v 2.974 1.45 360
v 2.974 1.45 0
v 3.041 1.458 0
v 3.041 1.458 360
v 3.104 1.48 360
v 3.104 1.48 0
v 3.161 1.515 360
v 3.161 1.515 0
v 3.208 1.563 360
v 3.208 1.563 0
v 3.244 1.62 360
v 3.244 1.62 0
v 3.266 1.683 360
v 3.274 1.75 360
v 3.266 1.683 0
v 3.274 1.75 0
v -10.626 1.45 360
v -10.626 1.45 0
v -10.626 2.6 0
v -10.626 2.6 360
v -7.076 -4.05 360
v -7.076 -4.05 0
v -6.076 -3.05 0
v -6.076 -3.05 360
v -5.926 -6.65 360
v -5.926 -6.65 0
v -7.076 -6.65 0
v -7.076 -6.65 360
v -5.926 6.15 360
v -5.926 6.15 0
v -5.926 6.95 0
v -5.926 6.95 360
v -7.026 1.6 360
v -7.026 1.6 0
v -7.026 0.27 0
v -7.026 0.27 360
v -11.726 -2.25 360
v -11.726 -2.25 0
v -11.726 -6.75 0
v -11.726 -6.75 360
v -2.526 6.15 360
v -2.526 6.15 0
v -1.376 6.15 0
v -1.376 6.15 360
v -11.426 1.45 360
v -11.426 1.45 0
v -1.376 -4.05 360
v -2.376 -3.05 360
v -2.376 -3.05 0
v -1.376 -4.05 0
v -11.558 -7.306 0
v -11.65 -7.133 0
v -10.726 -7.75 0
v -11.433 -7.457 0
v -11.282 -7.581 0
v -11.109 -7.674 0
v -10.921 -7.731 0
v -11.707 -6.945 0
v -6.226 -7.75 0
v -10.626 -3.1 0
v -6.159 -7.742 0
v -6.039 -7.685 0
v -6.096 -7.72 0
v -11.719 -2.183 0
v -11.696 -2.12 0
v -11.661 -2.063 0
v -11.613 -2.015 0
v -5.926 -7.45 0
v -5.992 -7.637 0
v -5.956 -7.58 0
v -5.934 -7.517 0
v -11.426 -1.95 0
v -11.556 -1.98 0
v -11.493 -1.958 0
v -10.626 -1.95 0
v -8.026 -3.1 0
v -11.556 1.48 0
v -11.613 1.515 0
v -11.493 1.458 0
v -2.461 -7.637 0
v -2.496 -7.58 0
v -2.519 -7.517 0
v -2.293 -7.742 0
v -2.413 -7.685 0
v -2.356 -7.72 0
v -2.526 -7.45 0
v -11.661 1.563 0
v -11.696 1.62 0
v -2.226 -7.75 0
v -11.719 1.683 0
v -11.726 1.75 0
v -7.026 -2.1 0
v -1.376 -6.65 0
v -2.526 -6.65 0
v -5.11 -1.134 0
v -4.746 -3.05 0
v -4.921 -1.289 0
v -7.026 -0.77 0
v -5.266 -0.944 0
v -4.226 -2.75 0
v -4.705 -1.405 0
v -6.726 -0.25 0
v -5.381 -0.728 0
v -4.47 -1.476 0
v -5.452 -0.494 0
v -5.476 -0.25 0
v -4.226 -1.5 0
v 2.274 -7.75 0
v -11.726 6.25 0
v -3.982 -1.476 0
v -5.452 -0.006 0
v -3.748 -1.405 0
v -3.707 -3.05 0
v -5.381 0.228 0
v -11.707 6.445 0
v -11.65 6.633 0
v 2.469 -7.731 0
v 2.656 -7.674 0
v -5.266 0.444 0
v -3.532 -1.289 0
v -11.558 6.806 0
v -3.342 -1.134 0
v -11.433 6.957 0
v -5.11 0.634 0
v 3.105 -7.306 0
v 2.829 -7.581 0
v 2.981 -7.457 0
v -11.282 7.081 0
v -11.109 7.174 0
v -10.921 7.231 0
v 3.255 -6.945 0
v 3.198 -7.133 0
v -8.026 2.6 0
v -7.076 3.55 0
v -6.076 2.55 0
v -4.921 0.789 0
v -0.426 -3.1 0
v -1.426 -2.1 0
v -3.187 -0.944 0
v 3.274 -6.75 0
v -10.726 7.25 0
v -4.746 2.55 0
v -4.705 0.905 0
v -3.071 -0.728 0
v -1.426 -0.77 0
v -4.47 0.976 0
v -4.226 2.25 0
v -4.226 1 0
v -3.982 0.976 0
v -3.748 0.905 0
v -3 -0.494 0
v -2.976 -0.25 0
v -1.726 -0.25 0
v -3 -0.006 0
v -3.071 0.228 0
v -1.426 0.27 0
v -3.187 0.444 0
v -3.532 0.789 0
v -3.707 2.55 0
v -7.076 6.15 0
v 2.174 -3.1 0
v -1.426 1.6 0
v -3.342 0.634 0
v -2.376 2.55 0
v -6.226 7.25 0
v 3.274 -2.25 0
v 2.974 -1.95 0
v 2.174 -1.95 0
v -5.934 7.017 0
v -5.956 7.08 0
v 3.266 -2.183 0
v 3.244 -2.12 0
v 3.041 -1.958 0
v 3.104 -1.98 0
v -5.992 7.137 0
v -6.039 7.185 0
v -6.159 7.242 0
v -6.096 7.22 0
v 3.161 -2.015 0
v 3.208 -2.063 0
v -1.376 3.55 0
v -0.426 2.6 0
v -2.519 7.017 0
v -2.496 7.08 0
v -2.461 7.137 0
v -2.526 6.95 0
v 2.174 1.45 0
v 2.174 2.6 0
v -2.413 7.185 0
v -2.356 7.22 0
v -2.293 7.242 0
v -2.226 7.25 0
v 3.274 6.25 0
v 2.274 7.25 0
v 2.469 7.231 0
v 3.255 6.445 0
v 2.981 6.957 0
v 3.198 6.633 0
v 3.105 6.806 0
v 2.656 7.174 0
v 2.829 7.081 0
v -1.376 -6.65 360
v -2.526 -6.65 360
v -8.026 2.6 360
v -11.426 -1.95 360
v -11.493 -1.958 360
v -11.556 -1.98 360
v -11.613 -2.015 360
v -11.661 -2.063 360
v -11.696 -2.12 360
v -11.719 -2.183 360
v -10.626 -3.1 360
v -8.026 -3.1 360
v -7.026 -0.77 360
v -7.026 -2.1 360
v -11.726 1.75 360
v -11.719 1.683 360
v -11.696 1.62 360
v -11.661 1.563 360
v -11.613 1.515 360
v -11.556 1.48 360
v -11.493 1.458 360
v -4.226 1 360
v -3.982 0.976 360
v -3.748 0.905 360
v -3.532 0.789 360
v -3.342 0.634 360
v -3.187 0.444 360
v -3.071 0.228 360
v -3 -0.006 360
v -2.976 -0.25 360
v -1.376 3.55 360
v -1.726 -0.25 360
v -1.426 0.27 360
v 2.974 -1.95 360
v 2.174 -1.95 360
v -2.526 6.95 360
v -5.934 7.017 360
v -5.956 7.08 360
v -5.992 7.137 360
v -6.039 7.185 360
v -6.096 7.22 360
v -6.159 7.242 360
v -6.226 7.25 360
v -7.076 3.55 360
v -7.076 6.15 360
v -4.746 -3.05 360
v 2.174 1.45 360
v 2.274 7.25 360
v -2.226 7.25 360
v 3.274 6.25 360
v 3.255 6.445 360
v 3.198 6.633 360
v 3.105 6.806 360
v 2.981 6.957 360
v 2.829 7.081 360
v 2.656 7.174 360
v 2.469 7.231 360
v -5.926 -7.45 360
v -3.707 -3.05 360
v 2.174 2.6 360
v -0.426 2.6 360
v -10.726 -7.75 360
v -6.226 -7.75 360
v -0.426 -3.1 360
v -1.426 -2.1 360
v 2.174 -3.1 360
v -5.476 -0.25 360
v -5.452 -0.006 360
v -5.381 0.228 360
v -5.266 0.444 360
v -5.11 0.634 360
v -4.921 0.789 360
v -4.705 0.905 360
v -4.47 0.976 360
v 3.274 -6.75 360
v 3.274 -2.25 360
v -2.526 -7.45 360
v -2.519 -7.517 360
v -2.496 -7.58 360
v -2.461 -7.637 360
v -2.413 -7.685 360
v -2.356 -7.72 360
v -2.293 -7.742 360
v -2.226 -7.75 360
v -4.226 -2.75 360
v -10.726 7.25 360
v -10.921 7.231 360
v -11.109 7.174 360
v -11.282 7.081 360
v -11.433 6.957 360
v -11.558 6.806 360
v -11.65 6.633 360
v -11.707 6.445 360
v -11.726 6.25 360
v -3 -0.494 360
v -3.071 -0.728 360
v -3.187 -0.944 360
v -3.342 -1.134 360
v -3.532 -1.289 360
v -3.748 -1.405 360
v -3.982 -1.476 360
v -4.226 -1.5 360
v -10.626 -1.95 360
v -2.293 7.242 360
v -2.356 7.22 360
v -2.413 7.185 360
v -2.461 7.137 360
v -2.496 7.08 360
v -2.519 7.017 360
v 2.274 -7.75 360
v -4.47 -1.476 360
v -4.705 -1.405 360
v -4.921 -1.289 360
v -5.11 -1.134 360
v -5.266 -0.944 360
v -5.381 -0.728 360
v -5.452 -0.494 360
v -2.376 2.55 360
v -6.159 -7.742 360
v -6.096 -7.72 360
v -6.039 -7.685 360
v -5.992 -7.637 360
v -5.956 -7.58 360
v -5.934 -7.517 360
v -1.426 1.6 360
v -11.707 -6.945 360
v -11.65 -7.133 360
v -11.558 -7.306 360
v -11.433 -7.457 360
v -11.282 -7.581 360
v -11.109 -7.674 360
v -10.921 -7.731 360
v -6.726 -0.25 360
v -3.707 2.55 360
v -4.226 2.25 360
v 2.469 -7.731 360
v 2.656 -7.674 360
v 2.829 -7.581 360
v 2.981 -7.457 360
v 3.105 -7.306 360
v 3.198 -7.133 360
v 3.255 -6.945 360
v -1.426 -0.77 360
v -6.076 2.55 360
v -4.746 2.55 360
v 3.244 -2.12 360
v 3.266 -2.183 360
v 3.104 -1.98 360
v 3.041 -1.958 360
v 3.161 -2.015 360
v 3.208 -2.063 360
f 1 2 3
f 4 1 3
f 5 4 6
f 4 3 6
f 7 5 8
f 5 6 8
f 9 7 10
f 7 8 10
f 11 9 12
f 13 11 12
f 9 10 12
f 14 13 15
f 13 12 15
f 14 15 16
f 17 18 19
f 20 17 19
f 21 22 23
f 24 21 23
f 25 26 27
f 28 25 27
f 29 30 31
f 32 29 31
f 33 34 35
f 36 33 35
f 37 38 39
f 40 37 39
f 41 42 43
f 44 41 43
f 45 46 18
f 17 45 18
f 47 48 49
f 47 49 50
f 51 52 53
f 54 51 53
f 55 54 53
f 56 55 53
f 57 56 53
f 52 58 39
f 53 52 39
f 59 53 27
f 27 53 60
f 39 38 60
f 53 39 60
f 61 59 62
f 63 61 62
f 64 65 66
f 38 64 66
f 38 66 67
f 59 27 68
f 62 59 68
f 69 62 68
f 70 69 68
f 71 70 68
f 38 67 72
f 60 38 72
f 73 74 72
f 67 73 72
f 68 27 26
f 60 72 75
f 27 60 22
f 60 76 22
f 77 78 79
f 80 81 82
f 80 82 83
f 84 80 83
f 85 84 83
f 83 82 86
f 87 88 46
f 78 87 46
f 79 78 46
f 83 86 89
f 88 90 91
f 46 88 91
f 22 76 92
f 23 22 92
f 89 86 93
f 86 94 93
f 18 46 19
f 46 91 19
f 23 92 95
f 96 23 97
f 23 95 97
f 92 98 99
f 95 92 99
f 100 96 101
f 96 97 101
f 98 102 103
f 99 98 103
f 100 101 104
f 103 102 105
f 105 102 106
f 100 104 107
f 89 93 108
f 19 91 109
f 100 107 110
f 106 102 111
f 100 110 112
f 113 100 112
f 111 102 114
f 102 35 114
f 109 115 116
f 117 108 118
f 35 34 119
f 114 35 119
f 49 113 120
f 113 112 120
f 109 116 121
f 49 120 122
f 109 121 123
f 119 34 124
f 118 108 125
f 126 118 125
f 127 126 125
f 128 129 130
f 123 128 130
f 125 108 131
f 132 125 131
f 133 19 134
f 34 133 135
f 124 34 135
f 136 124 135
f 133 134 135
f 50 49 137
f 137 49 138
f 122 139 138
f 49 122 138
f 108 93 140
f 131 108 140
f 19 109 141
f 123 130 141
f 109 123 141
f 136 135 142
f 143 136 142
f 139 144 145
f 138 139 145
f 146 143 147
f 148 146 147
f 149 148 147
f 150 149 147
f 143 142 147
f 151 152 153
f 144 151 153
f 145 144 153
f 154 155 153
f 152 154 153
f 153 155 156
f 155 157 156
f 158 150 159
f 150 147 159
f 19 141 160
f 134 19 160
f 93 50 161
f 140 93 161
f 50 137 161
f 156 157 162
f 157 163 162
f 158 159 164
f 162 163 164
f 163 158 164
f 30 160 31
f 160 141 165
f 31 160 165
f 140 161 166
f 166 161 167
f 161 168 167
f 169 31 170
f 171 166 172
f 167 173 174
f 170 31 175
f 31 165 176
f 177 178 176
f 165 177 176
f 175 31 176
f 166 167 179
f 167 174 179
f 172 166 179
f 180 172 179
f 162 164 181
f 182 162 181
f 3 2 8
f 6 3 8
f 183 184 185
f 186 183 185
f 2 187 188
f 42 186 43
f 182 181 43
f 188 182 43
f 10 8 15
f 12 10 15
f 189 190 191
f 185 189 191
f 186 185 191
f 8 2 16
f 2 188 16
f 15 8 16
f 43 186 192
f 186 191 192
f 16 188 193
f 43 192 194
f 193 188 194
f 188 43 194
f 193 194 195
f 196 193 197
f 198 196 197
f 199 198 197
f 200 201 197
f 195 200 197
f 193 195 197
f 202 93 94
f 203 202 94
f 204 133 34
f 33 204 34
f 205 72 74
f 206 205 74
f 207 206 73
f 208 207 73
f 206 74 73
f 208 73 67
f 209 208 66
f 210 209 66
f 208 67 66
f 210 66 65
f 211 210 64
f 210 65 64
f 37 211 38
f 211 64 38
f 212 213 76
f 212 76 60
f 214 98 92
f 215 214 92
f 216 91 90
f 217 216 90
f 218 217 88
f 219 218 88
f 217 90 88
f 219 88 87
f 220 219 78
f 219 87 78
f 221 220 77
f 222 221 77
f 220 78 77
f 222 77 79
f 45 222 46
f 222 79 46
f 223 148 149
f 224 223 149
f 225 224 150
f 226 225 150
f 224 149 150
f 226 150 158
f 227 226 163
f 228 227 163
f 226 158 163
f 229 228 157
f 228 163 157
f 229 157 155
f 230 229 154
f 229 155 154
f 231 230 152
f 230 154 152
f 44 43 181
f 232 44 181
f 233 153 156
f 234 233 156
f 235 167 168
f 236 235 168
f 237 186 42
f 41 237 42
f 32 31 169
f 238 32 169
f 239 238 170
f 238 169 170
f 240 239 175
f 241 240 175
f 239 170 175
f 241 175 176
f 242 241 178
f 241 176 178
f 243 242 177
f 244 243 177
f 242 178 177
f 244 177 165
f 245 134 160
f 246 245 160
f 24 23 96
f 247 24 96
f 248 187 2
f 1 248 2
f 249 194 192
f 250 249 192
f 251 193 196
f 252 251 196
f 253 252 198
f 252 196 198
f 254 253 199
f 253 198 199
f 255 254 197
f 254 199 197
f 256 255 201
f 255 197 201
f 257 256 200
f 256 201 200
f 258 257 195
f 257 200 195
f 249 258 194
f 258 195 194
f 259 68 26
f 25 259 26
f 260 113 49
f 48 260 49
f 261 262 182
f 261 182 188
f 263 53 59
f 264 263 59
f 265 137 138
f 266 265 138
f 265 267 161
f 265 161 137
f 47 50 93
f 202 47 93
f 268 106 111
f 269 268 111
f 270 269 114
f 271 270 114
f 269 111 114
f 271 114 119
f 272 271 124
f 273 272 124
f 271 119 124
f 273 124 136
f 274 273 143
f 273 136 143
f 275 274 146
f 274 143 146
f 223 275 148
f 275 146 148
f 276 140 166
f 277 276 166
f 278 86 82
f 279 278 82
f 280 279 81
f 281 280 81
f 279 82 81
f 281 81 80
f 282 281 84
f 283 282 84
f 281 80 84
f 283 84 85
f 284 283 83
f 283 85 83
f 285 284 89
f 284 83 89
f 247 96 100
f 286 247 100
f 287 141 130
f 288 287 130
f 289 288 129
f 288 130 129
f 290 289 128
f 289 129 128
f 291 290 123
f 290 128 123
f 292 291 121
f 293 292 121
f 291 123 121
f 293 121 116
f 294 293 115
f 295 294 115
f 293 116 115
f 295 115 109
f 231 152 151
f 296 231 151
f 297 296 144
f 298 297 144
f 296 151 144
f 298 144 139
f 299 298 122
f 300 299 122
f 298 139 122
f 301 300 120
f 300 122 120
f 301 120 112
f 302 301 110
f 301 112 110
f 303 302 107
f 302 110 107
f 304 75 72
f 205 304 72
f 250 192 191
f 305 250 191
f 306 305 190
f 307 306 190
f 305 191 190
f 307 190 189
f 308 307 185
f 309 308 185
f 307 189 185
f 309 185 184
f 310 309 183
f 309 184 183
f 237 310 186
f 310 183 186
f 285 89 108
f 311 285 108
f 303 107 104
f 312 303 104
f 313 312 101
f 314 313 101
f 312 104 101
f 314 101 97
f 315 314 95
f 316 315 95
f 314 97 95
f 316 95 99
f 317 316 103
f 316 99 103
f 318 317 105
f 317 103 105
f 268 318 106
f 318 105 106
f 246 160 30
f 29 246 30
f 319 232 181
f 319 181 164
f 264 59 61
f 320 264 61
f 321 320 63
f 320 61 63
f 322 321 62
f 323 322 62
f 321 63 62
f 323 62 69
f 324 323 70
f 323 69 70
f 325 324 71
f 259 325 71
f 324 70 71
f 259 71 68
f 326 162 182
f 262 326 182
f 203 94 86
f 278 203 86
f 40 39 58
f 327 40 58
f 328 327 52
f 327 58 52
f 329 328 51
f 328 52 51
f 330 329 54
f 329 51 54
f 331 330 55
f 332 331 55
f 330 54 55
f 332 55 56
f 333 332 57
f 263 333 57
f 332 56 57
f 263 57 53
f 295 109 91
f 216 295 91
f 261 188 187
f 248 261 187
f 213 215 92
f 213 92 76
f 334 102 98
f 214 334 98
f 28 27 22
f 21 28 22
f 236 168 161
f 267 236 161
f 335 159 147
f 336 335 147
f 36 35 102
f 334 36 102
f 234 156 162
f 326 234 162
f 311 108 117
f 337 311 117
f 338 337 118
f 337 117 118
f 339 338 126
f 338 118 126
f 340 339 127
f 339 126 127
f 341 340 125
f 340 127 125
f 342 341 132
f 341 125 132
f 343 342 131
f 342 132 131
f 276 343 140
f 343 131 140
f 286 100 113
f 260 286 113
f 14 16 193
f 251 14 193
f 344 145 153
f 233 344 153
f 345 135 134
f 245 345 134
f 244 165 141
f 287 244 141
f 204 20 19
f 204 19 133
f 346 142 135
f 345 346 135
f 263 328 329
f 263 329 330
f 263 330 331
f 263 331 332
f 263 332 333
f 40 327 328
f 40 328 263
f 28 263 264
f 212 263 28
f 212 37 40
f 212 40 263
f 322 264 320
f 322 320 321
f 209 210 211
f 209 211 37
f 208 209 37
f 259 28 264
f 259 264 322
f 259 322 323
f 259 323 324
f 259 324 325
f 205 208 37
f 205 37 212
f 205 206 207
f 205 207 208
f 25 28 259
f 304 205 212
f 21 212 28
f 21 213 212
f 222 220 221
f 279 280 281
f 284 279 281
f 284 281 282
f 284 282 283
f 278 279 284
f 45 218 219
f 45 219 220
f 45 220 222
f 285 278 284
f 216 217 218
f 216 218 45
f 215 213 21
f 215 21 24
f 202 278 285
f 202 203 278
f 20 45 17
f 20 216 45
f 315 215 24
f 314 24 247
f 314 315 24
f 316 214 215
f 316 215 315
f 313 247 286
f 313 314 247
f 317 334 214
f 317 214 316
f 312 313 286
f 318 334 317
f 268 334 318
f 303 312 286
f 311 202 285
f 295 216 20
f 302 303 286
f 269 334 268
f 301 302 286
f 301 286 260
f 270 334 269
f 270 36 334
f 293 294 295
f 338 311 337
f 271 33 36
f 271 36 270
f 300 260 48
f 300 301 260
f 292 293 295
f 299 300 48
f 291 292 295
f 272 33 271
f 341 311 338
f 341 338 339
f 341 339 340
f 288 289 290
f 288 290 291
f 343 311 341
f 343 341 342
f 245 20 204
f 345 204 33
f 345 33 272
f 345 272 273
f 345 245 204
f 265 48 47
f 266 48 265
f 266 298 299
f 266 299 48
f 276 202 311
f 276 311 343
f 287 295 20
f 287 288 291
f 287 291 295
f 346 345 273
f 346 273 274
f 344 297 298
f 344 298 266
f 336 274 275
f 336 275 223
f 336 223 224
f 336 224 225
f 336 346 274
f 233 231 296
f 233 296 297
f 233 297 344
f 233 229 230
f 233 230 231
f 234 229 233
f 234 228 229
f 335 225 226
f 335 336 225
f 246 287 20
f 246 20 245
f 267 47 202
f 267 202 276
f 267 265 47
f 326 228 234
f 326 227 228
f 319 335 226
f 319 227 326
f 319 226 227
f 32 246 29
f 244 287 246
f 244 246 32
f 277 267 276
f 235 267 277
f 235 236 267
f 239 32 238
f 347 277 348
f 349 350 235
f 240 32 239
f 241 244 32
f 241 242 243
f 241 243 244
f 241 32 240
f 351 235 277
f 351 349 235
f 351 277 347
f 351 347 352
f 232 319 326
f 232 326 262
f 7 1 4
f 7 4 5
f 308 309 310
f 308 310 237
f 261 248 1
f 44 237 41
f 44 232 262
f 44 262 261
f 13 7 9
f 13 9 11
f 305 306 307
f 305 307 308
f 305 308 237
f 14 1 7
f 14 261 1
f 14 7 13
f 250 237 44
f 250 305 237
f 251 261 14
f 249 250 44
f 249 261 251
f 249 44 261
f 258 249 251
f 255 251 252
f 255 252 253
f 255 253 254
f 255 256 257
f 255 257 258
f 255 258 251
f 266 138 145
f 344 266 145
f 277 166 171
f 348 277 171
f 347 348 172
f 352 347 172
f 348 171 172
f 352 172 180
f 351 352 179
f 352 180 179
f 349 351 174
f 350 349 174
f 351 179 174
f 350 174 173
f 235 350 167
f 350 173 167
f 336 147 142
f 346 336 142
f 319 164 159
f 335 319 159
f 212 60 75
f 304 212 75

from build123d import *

# Parameters (mm, degrees)
F1_DEPTH = 360


with BuildPart() as f1:
    # F0 (on Top) → F1 (new body)
    with BuildSketch(Plane.XY):
        with BuildLine():
            ThreePointArc((-10.72619, 7.25), (-11.433297, 6.957107), (-11.72619, 6.25))
            Line((-11.72619, 6.25), (-11.72619, 1.75))
            ThreePointArc((-11.72619, 1.75), (-11.638322, 1.537868), (-11.42619, 1.45))
            Line((-11.42619, 1.45), (-10.62619, 1.45))
            Line((-10.62619, 1.45), (-10.62619, 2.6))
            Line((-10.62619, 2.6), (-8.02619, 2.6))
            Line((-8.02619, 2.6), (-7.02619, 1.6))
            Line((-7.02619, 1.6), (-7.02619, 0.269615))
            Line((-7.02619, 0.269615), (-6.72619, -0.25))
            Line((-6.72619, -0.25), (-7.02619, -0.769615))
            Line((-7.02619, -0.769615), (-7.02619, -2.1))
            Line((-7.02619, -2.1), (-8.02619, -3.1))
            Line((-8.02619, -3.1), (-10.62619, -3.1))
            Line((-10.62619, -3.1), (-10.62619, -1.95))
            Line((-10.62619, -1.95), (-11.42619, -1.95))
            ThreePointArc((-11.42619, -1.95), (-11.638322, -2.037868), (-11.72619, -2.25))
            Line((-11.72619, -2.25), (-11.72619, -6.75))
            ThreePointArc((-11.72619, -6.75), (-11.433297, -7.457107), (-10.72619, -7.75))
            Line((-10.72619, -7.75), (-6.22619, -7.75))
            ThreePointArc((-6.22619, -7.75), (-6.014058, -7.662132), (-5.92619, -7.45))
            Line((-5.92619, -7.45), (-5.92619, -6.65))
            Line((-5.92619, -6.65), (-7.07619, -6.65))
            Line((-7.07619, -6.65), (-7.07619, -4.05))
            Line((-7.07619, -4.05), (-6.07619, -3.05))
            Line((-6.07619, -3.05), (-4.745805, -3.05))
            Line((-4.745805, -3.05), (-4.22619, -2.75))
            Line((-4.22619, -2.75), (-3.706575, -3.05))
            Line((-3.706575, -3.05), (-2.37619, -3.05))
            Line((-2.37619, -3.05), (-1.37619, -4.05))
            Line((-1.37619, -4.05), (-1.37619, -6.65))
            Line((-1.37619, -6.65), (-2.52619, -6.65))
            Line((-2.52619, -6.65), (-2.52619, -7.45))
            ThreePointArc((-2.52619, -7.45), (-2.438322, -7.662132), (-2.22619, -7.75))
            Line((-2.22619, -7.75), (2.27381, -7.75))
            ThreePointArc((2.27381, -7.75), (2.980917, -7.457107), (3.27381, -6.75))
            Line((3.27381, -6.75), (3.27381, -2.25))
            ThreePointArc((3.27381, -2.25), (3.185942, -2.037868), (2.97381, -1.95))
            Line((2.97381, -1.95), (2.17381, -1.95))
            Line((2.17381, -1.95), (2.17381, -3.1))
            Line((2.17381, -3.1), (-0.42619, -3.1))
            Line((-0.42619, -3.1), (-1.42619, -2.1))
            Line((-1.42619, -2.1), (-1.42619, -0.769615))
            Line((-1.42619, -0.769615), (-1.72619, -0.25))
            Line((-1.72619, -0.25), (-1.42619, 0.269615))
            Line((-1.42619, 0.269615), (-1.42619, 1.6))
            Line((-1.42619, 1.6), (-0.42619, 2.6))
            Line((-0.42619, 2.6), (2.17381, 2.6))
            Line((2.17381, 2.6), (2.17381, 1.45))
            Line((2.17381, 1.45), (2.97381, 1.45))
            ThreePointArc((2.97381, 1.45), (3.185942, 1.537868), (3.27381, 1.75))
            Line((3.27381, 1.75), (3.27381, 6.25))
            ThreePointArc((3.27381, 6.25), (2.980917, 6.957107), (2.27381, 7.25))
            Line((2.27381, 7.25), (-2.22619, 7.25))
            ThreePointArc((-2.22619, 7.25), (-2.438322, 7.162132), (-2.52619, 6.95))
            Line((-2.52619, 6.95), (-2.52619, 6.15))
            Line((-2.52619, 6.15), (-1.37619, 6.15))
            Line((-1.37619, 6.15), (-1.37619, 3.55))
            Line((-1.37619, 3.55), (-2.37619, 2.55))
            Line((-2.37619, 2.55), (-3.706575, 2.55))
            Line((-3.706575, 2.55), (-4.22619, 2.25))
            Line((-4.22619, 2.25), (-4.745805, 2.55))
            Line((-4.745805, 2.55), (-6.07619, 2.55))
            Line((-6.07619, 2.55), (-7.07619, 3.55))
            Line((-7.07619, 3.55), (-7.07619, 6.15))
            Line((-7.07619, 6.15), (-5.92619, 6.15))
            Line((-5.92619, 6.15), (-5.92619, 6.95))
            ThreePointArc((-5.92619, 6.95), (-6.014058, 7.162132), (-6.22619, 7.25))
            Line((-6.22619, 7.25), (-10.72619, 7.25))
        make_face()
        with BuildLine():
            ThreePointArc((-4.22619, -1.5), (-5.110073, -1.133883), (-5.47619, -0.25))
            ThreePointArc((-5.47619, -0.25), (-5.110073, 0.633883), (-4.22619, 1))
            ThreePointArc((-4.22619, 1), (-3.342307, 0.633883), (-2.97619, -0.25))
            ThreePointArc((-2.97619, -0.25), (-3.342307, -1.133883), (-4.22619, -1.5))
        make_face(mode=Mode.SUBTRACT)
    extrude(amount=F1_DEPTH)


solid = f1.part
